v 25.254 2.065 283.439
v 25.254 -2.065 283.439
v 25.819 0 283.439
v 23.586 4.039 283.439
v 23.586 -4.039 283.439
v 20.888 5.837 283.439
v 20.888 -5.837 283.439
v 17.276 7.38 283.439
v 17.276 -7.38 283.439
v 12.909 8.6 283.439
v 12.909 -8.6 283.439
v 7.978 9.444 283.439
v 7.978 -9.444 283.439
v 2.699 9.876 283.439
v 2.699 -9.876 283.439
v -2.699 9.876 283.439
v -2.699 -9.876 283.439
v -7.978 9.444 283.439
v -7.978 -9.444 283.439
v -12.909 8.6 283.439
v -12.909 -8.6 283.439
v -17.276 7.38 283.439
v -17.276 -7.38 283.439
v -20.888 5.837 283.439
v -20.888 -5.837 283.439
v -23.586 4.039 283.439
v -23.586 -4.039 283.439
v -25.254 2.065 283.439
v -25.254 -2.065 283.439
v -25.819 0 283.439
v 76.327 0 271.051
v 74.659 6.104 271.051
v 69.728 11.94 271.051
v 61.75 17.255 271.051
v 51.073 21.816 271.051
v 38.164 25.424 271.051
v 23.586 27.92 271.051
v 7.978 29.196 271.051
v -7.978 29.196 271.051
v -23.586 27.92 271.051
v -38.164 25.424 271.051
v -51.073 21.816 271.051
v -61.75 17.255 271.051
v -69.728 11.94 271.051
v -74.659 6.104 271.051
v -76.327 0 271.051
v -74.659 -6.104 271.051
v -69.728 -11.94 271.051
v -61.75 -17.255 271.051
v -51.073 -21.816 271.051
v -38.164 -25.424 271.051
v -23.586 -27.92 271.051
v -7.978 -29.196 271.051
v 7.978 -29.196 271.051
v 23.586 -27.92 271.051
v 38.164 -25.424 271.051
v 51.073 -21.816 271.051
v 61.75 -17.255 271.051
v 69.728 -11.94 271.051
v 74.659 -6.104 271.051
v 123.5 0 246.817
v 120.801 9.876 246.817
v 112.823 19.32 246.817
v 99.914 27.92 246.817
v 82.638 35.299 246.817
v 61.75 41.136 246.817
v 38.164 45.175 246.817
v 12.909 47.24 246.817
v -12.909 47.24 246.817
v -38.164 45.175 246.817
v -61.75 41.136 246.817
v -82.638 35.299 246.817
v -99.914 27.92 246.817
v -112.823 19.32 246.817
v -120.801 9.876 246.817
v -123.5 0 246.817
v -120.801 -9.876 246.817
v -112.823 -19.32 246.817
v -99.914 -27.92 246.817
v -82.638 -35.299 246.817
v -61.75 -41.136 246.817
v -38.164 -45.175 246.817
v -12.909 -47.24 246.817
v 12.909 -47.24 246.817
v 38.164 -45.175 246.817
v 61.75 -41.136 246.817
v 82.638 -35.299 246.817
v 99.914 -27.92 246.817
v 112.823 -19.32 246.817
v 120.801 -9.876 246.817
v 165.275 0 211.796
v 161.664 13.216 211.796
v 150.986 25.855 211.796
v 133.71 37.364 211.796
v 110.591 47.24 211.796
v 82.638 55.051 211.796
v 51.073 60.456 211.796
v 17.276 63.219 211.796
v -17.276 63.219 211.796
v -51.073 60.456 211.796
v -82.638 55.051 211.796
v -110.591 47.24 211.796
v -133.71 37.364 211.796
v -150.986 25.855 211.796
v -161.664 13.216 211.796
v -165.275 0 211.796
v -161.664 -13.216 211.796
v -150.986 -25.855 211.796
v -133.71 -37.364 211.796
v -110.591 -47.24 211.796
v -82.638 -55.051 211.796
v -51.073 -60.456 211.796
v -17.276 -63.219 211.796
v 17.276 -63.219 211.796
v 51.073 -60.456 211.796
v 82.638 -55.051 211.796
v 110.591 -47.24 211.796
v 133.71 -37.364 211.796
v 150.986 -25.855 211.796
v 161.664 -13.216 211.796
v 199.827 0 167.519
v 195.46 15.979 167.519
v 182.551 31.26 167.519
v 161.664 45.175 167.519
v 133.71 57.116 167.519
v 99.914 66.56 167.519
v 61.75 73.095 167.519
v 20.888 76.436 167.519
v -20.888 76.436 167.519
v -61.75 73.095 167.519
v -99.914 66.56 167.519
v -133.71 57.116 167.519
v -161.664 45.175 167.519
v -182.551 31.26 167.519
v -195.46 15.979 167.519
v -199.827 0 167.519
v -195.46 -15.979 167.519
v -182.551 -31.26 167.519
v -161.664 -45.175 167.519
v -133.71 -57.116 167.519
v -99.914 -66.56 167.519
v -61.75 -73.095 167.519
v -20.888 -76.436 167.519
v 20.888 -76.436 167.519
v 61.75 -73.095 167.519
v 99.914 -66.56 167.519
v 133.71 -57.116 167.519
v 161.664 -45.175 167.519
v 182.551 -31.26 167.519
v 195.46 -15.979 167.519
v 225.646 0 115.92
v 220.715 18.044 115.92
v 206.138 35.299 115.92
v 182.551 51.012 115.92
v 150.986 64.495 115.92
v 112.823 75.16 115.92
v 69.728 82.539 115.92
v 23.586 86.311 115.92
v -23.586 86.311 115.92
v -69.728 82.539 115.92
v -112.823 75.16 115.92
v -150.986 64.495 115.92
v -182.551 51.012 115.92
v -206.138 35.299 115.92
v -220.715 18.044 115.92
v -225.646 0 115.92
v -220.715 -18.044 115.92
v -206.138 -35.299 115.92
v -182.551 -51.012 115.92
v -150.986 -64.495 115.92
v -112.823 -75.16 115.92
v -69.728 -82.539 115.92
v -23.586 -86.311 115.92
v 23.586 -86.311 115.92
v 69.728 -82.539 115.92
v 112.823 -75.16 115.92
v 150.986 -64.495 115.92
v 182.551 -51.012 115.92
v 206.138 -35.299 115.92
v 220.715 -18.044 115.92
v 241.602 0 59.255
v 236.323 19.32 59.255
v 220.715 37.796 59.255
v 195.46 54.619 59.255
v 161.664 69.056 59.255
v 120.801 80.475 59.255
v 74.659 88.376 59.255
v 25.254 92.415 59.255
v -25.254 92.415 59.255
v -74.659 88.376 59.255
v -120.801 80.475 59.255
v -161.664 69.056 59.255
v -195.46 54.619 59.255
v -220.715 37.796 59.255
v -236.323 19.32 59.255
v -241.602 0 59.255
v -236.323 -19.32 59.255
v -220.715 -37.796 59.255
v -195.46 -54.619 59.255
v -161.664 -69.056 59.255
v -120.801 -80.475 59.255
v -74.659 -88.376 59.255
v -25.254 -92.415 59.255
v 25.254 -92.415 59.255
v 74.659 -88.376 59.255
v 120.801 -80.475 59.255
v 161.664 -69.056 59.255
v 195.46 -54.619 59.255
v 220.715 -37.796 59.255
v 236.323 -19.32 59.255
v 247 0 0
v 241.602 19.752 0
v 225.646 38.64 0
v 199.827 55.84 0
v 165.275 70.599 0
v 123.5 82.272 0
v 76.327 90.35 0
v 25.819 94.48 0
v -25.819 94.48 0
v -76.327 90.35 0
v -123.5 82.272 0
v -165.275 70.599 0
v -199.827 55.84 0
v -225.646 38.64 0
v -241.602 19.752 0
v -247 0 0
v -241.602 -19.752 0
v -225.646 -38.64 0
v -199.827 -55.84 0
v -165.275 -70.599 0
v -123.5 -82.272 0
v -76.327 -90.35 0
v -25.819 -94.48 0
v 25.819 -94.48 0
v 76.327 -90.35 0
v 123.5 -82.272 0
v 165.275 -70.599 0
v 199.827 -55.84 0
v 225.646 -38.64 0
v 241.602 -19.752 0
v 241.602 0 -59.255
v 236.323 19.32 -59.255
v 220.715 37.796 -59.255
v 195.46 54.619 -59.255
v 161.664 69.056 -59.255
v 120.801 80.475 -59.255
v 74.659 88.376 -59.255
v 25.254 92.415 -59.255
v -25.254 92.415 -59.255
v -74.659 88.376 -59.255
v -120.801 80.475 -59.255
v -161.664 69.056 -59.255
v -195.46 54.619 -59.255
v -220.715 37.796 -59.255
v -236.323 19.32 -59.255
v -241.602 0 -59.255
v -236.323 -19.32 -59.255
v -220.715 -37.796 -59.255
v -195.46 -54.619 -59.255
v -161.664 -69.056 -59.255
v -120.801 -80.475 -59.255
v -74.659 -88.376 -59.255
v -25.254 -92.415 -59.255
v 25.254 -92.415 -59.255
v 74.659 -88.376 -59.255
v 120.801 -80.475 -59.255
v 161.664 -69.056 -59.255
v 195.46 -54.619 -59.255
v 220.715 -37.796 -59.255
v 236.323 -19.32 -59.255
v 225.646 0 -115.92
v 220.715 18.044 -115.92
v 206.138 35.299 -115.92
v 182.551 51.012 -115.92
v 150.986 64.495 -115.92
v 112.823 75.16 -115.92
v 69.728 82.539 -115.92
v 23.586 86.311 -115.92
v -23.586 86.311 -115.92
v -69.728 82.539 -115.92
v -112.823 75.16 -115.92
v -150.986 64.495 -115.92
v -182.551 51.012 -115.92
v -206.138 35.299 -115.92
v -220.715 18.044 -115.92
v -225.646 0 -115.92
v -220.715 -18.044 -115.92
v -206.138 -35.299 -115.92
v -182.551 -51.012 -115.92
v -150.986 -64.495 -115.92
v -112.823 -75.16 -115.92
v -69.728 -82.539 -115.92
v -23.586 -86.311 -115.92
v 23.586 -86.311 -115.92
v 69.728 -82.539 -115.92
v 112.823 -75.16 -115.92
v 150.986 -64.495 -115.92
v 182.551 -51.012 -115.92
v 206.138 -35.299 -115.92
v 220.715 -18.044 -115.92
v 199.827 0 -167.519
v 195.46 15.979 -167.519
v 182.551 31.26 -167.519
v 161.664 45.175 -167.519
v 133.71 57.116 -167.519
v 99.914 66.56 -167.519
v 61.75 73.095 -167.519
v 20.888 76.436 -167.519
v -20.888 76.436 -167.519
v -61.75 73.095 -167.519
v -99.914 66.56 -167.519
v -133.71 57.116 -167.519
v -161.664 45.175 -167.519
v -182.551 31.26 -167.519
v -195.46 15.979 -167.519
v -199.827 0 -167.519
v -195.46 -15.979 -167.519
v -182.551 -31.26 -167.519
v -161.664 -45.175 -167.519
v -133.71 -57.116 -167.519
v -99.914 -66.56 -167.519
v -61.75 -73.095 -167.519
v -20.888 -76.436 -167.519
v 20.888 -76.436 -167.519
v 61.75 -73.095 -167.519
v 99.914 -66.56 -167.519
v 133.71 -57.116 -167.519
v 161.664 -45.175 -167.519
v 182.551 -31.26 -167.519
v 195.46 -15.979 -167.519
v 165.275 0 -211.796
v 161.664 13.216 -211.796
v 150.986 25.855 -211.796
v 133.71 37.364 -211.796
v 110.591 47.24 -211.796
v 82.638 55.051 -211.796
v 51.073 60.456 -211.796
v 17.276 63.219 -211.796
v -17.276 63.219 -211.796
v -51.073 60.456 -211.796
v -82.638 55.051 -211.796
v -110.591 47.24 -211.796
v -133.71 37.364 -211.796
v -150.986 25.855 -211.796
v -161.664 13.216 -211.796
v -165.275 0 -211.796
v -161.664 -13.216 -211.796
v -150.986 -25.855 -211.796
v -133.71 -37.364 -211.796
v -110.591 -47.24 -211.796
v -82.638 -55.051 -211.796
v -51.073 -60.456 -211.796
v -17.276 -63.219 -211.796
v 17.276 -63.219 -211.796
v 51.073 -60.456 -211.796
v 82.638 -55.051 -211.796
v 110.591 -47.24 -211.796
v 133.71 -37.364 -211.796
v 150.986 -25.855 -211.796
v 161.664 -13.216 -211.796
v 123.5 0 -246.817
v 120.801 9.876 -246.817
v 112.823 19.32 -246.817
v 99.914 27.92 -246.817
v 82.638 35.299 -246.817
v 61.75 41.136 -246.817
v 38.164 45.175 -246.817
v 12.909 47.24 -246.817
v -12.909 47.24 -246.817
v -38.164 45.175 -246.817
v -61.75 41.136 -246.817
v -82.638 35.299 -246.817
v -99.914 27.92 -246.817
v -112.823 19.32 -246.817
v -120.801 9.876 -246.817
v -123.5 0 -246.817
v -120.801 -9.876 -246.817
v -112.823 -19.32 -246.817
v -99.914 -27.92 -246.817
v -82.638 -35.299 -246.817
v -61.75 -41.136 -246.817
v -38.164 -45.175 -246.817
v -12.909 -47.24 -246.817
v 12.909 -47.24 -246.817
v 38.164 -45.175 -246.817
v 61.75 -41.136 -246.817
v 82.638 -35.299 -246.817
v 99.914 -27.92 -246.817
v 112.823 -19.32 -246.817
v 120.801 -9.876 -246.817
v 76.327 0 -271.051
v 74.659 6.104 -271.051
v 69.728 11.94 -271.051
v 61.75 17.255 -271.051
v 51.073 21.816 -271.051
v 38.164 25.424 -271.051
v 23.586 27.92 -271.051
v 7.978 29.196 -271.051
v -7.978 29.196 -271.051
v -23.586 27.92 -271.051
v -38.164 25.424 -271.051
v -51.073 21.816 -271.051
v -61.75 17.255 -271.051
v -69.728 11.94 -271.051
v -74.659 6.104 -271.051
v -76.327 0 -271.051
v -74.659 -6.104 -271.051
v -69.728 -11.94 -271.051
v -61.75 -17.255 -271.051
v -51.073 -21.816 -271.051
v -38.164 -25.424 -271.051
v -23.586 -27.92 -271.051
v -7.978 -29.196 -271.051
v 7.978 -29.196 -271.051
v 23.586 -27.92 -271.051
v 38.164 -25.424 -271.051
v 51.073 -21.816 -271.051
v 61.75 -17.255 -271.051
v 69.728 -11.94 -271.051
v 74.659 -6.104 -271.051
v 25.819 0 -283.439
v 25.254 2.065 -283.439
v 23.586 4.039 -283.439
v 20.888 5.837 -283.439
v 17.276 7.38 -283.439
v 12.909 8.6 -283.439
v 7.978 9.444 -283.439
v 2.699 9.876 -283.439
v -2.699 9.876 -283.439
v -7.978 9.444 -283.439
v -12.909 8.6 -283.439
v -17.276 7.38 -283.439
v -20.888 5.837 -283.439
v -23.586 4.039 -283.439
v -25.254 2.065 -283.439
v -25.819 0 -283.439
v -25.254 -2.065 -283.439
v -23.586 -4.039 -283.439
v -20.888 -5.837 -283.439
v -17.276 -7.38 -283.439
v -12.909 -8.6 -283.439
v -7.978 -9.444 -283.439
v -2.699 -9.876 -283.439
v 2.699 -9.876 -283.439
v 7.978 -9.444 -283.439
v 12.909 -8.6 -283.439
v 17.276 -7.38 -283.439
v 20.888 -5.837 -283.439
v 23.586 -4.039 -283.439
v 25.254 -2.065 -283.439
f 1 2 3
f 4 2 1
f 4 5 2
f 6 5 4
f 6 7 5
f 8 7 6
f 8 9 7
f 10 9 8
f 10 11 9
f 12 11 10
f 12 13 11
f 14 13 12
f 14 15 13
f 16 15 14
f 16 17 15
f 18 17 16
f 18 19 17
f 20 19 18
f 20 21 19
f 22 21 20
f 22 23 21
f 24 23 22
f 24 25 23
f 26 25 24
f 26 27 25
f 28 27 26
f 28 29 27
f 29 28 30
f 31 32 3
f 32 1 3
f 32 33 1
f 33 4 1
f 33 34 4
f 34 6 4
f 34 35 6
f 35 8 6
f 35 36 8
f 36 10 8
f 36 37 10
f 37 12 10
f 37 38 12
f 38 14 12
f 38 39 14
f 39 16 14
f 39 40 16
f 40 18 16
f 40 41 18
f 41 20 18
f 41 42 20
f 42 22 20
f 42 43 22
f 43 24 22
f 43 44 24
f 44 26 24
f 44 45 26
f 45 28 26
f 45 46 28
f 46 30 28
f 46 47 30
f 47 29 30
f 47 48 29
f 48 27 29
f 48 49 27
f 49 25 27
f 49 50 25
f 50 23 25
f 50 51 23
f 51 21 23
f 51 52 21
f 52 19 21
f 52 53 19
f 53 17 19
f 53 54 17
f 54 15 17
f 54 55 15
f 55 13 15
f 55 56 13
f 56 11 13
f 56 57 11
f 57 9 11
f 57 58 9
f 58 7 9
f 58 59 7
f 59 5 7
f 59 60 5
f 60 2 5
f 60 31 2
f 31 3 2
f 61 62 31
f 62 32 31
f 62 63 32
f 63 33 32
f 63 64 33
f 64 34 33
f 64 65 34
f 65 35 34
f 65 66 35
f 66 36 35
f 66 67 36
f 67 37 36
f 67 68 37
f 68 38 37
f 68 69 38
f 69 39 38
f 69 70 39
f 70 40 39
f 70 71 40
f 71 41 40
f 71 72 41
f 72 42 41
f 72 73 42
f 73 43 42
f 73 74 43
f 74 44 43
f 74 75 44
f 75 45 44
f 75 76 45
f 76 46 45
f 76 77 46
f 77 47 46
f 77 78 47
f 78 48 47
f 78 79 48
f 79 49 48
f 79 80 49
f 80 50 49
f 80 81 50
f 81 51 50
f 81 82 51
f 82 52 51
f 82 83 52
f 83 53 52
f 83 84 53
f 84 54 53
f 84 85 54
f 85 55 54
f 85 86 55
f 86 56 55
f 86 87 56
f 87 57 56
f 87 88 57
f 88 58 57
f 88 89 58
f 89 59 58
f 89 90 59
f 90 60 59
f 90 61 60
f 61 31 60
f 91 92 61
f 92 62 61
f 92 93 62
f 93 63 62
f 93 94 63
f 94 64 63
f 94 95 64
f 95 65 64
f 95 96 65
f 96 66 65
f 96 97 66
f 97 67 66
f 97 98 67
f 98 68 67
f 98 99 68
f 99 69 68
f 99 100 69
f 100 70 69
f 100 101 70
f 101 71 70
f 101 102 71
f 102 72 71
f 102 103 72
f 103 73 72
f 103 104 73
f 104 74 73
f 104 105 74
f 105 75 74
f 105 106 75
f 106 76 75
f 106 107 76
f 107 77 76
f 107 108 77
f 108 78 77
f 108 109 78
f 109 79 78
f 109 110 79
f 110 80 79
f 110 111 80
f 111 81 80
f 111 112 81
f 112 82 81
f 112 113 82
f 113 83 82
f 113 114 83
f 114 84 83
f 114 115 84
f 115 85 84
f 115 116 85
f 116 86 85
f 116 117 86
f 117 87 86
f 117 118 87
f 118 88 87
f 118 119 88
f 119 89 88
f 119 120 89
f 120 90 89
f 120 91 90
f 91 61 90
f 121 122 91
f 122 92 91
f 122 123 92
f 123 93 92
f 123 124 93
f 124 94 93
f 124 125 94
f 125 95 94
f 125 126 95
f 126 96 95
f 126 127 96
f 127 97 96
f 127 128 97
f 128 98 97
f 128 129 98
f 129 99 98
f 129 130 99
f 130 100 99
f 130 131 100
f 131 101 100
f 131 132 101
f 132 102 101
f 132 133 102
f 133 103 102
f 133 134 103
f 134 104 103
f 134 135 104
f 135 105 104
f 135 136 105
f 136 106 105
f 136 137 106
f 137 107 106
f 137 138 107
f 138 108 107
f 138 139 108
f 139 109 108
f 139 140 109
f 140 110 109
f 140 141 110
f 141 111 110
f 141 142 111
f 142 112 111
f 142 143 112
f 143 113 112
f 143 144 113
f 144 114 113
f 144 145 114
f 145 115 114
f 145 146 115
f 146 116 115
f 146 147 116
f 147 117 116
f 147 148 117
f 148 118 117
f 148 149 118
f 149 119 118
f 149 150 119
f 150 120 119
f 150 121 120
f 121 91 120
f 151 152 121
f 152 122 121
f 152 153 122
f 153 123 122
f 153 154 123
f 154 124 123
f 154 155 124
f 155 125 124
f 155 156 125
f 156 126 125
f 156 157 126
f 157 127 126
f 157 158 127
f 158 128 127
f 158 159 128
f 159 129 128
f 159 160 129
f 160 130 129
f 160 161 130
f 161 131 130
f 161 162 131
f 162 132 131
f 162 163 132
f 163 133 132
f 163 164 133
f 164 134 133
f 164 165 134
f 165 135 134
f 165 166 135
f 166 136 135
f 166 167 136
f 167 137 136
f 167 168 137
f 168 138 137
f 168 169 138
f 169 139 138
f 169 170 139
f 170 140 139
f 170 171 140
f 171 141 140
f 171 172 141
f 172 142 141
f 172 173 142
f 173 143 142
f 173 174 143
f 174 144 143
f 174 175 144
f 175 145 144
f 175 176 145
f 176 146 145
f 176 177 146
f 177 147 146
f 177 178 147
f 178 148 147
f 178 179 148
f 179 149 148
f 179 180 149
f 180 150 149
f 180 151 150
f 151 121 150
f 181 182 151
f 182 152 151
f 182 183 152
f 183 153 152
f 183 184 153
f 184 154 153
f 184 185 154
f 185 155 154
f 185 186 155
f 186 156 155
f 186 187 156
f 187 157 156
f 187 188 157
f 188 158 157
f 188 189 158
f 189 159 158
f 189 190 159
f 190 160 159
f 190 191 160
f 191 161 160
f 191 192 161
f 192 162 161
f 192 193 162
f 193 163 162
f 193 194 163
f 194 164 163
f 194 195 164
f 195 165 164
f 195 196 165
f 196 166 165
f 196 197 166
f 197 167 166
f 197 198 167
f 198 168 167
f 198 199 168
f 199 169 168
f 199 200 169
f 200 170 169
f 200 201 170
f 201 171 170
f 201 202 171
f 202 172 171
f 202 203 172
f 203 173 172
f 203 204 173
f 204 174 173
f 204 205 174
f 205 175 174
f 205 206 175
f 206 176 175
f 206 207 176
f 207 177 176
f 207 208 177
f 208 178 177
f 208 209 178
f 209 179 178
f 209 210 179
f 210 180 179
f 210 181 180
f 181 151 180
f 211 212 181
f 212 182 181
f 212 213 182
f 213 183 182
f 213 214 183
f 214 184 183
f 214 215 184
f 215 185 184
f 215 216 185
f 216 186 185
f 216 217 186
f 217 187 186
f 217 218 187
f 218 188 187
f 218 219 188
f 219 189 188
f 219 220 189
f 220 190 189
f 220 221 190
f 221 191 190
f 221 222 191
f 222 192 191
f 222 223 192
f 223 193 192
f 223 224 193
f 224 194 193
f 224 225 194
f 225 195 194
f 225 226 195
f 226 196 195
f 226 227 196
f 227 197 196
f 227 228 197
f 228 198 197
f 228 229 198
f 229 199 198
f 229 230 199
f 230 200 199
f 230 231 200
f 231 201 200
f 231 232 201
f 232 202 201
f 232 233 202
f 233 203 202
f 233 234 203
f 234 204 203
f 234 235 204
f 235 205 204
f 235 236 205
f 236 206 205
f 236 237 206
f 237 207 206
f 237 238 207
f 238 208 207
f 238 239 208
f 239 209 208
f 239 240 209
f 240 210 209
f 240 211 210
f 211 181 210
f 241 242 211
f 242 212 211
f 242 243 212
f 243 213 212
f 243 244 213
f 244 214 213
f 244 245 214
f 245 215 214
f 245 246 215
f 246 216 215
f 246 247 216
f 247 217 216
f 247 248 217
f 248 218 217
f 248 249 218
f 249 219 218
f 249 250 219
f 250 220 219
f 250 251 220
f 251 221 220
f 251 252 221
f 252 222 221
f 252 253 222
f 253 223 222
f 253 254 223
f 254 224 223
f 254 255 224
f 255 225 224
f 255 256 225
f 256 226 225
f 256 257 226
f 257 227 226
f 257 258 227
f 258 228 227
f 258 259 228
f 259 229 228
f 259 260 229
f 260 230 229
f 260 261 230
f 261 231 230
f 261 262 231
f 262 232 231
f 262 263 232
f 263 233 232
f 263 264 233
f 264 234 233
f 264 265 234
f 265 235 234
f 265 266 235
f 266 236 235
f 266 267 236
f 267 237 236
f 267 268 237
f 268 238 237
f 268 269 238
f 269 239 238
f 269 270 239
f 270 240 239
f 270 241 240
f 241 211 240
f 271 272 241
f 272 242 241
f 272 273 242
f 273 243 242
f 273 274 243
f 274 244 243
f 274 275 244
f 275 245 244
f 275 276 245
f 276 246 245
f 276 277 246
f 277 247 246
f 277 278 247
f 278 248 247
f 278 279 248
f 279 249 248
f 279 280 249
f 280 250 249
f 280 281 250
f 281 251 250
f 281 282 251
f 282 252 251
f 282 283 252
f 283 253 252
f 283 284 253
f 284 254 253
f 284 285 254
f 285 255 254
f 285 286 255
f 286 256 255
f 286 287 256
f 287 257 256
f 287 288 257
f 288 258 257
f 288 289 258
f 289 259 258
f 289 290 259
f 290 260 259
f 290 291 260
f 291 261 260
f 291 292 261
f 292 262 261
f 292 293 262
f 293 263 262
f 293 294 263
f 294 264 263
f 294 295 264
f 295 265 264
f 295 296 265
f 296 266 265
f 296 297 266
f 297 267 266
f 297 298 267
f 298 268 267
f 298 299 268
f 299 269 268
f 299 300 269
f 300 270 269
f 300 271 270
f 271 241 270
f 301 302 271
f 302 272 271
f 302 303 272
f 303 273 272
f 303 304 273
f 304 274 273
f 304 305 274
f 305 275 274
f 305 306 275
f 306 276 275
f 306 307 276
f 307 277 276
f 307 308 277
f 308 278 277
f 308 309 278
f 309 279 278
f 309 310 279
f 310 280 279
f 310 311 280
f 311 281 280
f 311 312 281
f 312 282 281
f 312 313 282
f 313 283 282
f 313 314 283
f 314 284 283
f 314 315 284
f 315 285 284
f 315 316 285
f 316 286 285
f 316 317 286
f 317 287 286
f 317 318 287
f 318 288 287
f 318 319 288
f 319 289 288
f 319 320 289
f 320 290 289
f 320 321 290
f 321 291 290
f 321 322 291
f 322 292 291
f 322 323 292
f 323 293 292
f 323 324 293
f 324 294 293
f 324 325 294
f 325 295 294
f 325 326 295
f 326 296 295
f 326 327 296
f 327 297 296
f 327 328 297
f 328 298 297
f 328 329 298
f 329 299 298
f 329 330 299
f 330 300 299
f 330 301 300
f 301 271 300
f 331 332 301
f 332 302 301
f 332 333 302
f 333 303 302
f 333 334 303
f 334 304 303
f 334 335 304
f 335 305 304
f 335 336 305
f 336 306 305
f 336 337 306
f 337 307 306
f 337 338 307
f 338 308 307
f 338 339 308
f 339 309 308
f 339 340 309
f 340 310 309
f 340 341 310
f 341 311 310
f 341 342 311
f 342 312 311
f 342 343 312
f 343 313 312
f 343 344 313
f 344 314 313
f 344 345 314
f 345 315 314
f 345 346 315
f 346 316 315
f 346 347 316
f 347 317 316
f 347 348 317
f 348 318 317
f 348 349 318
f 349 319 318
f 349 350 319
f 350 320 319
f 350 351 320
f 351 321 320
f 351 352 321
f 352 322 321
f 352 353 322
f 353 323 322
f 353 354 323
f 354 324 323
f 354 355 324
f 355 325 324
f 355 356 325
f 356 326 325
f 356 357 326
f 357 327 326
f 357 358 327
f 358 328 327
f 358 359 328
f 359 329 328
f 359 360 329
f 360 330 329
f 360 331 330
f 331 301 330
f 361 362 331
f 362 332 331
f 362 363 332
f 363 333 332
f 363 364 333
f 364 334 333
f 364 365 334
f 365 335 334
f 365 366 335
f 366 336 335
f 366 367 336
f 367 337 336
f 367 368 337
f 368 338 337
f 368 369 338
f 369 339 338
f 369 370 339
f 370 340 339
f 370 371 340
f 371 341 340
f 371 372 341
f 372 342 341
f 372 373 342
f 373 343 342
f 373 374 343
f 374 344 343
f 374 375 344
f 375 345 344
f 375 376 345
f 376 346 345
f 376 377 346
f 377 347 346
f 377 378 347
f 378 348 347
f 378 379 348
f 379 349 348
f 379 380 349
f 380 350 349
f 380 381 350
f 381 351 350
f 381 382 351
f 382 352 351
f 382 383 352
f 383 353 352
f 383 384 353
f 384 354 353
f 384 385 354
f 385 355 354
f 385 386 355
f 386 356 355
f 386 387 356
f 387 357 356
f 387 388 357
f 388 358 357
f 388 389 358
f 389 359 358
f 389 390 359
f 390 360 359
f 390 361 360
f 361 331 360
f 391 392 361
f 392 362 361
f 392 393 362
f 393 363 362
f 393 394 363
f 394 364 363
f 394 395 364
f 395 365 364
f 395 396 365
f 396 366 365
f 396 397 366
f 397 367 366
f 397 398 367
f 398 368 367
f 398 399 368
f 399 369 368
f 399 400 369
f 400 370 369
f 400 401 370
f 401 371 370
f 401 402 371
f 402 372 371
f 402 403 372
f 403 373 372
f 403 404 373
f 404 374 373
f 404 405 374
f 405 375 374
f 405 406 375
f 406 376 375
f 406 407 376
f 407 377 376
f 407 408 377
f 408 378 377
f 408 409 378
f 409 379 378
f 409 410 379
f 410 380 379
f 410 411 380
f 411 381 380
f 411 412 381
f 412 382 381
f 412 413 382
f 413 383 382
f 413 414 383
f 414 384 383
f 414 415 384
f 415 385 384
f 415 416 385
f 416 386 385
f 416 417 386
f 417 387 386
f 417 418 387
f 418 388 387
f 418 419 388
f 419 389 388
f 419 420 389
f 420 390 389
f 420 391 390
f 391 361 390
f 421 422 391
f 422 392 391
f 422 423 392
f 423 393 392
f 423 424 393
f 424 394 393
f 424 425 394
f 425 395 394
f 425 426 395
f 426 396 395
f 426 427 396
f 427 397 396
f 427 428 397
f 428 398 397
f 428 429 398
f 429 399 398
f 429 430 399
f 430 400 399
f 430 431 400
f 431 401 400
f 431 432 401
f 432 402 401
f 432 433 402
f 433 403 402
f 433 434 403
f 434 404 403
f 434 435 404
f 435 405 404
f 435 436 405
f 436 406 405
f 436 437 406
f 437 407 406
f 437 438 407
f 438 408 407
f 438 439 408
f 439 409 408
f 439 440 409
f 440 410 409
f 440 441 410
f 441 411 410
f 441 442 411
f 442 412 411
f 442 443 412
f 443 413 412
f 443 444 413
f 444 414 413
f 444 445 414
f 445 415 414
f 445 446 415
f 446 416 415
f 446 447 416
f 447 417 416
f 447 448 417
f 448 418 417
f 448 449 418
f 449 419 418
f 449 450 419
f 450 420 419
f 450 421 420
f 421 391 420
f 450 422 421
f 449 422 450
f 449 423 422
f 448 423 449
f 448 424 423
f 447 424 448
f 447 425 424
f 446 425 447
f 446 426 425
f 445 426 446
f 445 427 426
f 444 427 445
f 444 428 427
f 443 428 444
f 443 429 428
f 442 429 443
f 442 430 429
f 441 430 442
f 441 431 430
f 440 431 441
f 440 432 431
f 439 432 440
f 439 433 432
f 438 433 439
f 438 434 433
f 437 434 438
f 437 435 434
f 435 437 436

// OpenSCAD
// Generated by SolidPython 1.0.1 on 2020-07-29 00:46:50


scale(v = [13, 5, 15]) {
	sphere(r = 19);
}
/***********************************************
*********      SolidPython code:      **********
************************************************
 
# import packages: SolidPython
from solid import *
from solid.utils import *
from itertools import chain, combinations, permutations


class Resize:

    def __init__(self, scad_file):
        self.scad_file = scad_file
        #self.scad_file = import_scad(scad_file)
        # cone/cylinder param:
        self.r1 = 0
        self.r2 = 0
        self.h = 0
        # rectangular prism param:
        self.w = 0
        self.l = 0
        # ellipse param:
        self.r = 0

    # import OpenScad code (file name corresponds to shape)


    # classify shape + parameters
    def assign(self, param1, param2, param3):
        if self.scad_file == 'cone.scad':
            self.r1 = param1
            self.r2 = param2
            self.h = param3
        elif self.scad_file == 'cylinder.scad':
            self.r1 = param1
            self.r2 = param2
            self.h = param3
        elif self.scad_file == 'rectangularPrism.scad':
            self.h = param1
            self.l = param2
            self.w = param3
        else:
            self.r = param1
            self.h = param2

    # resize parameters
    def iterate(self):
        x = range(3, 20, 2)
        i = 1
        if self.scad_file == 'cone.scad':
            tempList = list(permutations(x, 2))
            for temp in tempList:
                param1 = temp[0]
                param2 = temp[1]
                filepath = 'produced_scad_files/' + 'cone' + str(param1) + '_' + str(param2) + '_' + '.scad'
                scad_render_to_file(cylinder(h=param1, r1=param2, r2=0), filepath)

        elif self.scad_file == 'cylinder.scad':
            tempList = list(permutations(x, 3))
            for temp in tempList:
                param1 = temp[0]
                param2 = temp[1]
                filepath = 'produced_scad_files/' + 'cylinder' + str(param1) + '_' + str(param2) + '_' + '.scad'
                scad_render_to_file(cylinder(h=param1, r1=param2, r2=param2), filepath)

        elif self.scad_file == 'rectangularPrism.scad':
            tempList = list(permutations(x, 3))
            for temp in tempList:
                param1 = temp[0]
                param2 = temp[1]
                param3 = temp[2]
                filepath = 'produced_scad_files/' + 'rectangularPrism' + str(param1) + '_' + str(param2) + '_' + str(
                    param3) + '.scad'
                scad_render_to_file(cube(size=(param1, param2, param3)), filepath)

        elif self.scad_file == 'ellipse.scad':
            tempList = list(permutations(x, 4))
            for temp in tempList:
                param1 = temp[0]
                param2 = temp[1]
                param3 = temp[2]
                param4 = temp[3]
                filepath = 'produced_scad_files/' + 'ellipse' + str(param1) + '_' + str(param2) + '_' + str(param3) + '_' + str(param4) + '.scad'
                scad_render_to_file(scale([param1, param2, param3])(sphere(r=param4)), filepath)

    def render_to_scadfile(self):
        scad_render_to_file(scad, 'example.scad') 
 
************************************************/
